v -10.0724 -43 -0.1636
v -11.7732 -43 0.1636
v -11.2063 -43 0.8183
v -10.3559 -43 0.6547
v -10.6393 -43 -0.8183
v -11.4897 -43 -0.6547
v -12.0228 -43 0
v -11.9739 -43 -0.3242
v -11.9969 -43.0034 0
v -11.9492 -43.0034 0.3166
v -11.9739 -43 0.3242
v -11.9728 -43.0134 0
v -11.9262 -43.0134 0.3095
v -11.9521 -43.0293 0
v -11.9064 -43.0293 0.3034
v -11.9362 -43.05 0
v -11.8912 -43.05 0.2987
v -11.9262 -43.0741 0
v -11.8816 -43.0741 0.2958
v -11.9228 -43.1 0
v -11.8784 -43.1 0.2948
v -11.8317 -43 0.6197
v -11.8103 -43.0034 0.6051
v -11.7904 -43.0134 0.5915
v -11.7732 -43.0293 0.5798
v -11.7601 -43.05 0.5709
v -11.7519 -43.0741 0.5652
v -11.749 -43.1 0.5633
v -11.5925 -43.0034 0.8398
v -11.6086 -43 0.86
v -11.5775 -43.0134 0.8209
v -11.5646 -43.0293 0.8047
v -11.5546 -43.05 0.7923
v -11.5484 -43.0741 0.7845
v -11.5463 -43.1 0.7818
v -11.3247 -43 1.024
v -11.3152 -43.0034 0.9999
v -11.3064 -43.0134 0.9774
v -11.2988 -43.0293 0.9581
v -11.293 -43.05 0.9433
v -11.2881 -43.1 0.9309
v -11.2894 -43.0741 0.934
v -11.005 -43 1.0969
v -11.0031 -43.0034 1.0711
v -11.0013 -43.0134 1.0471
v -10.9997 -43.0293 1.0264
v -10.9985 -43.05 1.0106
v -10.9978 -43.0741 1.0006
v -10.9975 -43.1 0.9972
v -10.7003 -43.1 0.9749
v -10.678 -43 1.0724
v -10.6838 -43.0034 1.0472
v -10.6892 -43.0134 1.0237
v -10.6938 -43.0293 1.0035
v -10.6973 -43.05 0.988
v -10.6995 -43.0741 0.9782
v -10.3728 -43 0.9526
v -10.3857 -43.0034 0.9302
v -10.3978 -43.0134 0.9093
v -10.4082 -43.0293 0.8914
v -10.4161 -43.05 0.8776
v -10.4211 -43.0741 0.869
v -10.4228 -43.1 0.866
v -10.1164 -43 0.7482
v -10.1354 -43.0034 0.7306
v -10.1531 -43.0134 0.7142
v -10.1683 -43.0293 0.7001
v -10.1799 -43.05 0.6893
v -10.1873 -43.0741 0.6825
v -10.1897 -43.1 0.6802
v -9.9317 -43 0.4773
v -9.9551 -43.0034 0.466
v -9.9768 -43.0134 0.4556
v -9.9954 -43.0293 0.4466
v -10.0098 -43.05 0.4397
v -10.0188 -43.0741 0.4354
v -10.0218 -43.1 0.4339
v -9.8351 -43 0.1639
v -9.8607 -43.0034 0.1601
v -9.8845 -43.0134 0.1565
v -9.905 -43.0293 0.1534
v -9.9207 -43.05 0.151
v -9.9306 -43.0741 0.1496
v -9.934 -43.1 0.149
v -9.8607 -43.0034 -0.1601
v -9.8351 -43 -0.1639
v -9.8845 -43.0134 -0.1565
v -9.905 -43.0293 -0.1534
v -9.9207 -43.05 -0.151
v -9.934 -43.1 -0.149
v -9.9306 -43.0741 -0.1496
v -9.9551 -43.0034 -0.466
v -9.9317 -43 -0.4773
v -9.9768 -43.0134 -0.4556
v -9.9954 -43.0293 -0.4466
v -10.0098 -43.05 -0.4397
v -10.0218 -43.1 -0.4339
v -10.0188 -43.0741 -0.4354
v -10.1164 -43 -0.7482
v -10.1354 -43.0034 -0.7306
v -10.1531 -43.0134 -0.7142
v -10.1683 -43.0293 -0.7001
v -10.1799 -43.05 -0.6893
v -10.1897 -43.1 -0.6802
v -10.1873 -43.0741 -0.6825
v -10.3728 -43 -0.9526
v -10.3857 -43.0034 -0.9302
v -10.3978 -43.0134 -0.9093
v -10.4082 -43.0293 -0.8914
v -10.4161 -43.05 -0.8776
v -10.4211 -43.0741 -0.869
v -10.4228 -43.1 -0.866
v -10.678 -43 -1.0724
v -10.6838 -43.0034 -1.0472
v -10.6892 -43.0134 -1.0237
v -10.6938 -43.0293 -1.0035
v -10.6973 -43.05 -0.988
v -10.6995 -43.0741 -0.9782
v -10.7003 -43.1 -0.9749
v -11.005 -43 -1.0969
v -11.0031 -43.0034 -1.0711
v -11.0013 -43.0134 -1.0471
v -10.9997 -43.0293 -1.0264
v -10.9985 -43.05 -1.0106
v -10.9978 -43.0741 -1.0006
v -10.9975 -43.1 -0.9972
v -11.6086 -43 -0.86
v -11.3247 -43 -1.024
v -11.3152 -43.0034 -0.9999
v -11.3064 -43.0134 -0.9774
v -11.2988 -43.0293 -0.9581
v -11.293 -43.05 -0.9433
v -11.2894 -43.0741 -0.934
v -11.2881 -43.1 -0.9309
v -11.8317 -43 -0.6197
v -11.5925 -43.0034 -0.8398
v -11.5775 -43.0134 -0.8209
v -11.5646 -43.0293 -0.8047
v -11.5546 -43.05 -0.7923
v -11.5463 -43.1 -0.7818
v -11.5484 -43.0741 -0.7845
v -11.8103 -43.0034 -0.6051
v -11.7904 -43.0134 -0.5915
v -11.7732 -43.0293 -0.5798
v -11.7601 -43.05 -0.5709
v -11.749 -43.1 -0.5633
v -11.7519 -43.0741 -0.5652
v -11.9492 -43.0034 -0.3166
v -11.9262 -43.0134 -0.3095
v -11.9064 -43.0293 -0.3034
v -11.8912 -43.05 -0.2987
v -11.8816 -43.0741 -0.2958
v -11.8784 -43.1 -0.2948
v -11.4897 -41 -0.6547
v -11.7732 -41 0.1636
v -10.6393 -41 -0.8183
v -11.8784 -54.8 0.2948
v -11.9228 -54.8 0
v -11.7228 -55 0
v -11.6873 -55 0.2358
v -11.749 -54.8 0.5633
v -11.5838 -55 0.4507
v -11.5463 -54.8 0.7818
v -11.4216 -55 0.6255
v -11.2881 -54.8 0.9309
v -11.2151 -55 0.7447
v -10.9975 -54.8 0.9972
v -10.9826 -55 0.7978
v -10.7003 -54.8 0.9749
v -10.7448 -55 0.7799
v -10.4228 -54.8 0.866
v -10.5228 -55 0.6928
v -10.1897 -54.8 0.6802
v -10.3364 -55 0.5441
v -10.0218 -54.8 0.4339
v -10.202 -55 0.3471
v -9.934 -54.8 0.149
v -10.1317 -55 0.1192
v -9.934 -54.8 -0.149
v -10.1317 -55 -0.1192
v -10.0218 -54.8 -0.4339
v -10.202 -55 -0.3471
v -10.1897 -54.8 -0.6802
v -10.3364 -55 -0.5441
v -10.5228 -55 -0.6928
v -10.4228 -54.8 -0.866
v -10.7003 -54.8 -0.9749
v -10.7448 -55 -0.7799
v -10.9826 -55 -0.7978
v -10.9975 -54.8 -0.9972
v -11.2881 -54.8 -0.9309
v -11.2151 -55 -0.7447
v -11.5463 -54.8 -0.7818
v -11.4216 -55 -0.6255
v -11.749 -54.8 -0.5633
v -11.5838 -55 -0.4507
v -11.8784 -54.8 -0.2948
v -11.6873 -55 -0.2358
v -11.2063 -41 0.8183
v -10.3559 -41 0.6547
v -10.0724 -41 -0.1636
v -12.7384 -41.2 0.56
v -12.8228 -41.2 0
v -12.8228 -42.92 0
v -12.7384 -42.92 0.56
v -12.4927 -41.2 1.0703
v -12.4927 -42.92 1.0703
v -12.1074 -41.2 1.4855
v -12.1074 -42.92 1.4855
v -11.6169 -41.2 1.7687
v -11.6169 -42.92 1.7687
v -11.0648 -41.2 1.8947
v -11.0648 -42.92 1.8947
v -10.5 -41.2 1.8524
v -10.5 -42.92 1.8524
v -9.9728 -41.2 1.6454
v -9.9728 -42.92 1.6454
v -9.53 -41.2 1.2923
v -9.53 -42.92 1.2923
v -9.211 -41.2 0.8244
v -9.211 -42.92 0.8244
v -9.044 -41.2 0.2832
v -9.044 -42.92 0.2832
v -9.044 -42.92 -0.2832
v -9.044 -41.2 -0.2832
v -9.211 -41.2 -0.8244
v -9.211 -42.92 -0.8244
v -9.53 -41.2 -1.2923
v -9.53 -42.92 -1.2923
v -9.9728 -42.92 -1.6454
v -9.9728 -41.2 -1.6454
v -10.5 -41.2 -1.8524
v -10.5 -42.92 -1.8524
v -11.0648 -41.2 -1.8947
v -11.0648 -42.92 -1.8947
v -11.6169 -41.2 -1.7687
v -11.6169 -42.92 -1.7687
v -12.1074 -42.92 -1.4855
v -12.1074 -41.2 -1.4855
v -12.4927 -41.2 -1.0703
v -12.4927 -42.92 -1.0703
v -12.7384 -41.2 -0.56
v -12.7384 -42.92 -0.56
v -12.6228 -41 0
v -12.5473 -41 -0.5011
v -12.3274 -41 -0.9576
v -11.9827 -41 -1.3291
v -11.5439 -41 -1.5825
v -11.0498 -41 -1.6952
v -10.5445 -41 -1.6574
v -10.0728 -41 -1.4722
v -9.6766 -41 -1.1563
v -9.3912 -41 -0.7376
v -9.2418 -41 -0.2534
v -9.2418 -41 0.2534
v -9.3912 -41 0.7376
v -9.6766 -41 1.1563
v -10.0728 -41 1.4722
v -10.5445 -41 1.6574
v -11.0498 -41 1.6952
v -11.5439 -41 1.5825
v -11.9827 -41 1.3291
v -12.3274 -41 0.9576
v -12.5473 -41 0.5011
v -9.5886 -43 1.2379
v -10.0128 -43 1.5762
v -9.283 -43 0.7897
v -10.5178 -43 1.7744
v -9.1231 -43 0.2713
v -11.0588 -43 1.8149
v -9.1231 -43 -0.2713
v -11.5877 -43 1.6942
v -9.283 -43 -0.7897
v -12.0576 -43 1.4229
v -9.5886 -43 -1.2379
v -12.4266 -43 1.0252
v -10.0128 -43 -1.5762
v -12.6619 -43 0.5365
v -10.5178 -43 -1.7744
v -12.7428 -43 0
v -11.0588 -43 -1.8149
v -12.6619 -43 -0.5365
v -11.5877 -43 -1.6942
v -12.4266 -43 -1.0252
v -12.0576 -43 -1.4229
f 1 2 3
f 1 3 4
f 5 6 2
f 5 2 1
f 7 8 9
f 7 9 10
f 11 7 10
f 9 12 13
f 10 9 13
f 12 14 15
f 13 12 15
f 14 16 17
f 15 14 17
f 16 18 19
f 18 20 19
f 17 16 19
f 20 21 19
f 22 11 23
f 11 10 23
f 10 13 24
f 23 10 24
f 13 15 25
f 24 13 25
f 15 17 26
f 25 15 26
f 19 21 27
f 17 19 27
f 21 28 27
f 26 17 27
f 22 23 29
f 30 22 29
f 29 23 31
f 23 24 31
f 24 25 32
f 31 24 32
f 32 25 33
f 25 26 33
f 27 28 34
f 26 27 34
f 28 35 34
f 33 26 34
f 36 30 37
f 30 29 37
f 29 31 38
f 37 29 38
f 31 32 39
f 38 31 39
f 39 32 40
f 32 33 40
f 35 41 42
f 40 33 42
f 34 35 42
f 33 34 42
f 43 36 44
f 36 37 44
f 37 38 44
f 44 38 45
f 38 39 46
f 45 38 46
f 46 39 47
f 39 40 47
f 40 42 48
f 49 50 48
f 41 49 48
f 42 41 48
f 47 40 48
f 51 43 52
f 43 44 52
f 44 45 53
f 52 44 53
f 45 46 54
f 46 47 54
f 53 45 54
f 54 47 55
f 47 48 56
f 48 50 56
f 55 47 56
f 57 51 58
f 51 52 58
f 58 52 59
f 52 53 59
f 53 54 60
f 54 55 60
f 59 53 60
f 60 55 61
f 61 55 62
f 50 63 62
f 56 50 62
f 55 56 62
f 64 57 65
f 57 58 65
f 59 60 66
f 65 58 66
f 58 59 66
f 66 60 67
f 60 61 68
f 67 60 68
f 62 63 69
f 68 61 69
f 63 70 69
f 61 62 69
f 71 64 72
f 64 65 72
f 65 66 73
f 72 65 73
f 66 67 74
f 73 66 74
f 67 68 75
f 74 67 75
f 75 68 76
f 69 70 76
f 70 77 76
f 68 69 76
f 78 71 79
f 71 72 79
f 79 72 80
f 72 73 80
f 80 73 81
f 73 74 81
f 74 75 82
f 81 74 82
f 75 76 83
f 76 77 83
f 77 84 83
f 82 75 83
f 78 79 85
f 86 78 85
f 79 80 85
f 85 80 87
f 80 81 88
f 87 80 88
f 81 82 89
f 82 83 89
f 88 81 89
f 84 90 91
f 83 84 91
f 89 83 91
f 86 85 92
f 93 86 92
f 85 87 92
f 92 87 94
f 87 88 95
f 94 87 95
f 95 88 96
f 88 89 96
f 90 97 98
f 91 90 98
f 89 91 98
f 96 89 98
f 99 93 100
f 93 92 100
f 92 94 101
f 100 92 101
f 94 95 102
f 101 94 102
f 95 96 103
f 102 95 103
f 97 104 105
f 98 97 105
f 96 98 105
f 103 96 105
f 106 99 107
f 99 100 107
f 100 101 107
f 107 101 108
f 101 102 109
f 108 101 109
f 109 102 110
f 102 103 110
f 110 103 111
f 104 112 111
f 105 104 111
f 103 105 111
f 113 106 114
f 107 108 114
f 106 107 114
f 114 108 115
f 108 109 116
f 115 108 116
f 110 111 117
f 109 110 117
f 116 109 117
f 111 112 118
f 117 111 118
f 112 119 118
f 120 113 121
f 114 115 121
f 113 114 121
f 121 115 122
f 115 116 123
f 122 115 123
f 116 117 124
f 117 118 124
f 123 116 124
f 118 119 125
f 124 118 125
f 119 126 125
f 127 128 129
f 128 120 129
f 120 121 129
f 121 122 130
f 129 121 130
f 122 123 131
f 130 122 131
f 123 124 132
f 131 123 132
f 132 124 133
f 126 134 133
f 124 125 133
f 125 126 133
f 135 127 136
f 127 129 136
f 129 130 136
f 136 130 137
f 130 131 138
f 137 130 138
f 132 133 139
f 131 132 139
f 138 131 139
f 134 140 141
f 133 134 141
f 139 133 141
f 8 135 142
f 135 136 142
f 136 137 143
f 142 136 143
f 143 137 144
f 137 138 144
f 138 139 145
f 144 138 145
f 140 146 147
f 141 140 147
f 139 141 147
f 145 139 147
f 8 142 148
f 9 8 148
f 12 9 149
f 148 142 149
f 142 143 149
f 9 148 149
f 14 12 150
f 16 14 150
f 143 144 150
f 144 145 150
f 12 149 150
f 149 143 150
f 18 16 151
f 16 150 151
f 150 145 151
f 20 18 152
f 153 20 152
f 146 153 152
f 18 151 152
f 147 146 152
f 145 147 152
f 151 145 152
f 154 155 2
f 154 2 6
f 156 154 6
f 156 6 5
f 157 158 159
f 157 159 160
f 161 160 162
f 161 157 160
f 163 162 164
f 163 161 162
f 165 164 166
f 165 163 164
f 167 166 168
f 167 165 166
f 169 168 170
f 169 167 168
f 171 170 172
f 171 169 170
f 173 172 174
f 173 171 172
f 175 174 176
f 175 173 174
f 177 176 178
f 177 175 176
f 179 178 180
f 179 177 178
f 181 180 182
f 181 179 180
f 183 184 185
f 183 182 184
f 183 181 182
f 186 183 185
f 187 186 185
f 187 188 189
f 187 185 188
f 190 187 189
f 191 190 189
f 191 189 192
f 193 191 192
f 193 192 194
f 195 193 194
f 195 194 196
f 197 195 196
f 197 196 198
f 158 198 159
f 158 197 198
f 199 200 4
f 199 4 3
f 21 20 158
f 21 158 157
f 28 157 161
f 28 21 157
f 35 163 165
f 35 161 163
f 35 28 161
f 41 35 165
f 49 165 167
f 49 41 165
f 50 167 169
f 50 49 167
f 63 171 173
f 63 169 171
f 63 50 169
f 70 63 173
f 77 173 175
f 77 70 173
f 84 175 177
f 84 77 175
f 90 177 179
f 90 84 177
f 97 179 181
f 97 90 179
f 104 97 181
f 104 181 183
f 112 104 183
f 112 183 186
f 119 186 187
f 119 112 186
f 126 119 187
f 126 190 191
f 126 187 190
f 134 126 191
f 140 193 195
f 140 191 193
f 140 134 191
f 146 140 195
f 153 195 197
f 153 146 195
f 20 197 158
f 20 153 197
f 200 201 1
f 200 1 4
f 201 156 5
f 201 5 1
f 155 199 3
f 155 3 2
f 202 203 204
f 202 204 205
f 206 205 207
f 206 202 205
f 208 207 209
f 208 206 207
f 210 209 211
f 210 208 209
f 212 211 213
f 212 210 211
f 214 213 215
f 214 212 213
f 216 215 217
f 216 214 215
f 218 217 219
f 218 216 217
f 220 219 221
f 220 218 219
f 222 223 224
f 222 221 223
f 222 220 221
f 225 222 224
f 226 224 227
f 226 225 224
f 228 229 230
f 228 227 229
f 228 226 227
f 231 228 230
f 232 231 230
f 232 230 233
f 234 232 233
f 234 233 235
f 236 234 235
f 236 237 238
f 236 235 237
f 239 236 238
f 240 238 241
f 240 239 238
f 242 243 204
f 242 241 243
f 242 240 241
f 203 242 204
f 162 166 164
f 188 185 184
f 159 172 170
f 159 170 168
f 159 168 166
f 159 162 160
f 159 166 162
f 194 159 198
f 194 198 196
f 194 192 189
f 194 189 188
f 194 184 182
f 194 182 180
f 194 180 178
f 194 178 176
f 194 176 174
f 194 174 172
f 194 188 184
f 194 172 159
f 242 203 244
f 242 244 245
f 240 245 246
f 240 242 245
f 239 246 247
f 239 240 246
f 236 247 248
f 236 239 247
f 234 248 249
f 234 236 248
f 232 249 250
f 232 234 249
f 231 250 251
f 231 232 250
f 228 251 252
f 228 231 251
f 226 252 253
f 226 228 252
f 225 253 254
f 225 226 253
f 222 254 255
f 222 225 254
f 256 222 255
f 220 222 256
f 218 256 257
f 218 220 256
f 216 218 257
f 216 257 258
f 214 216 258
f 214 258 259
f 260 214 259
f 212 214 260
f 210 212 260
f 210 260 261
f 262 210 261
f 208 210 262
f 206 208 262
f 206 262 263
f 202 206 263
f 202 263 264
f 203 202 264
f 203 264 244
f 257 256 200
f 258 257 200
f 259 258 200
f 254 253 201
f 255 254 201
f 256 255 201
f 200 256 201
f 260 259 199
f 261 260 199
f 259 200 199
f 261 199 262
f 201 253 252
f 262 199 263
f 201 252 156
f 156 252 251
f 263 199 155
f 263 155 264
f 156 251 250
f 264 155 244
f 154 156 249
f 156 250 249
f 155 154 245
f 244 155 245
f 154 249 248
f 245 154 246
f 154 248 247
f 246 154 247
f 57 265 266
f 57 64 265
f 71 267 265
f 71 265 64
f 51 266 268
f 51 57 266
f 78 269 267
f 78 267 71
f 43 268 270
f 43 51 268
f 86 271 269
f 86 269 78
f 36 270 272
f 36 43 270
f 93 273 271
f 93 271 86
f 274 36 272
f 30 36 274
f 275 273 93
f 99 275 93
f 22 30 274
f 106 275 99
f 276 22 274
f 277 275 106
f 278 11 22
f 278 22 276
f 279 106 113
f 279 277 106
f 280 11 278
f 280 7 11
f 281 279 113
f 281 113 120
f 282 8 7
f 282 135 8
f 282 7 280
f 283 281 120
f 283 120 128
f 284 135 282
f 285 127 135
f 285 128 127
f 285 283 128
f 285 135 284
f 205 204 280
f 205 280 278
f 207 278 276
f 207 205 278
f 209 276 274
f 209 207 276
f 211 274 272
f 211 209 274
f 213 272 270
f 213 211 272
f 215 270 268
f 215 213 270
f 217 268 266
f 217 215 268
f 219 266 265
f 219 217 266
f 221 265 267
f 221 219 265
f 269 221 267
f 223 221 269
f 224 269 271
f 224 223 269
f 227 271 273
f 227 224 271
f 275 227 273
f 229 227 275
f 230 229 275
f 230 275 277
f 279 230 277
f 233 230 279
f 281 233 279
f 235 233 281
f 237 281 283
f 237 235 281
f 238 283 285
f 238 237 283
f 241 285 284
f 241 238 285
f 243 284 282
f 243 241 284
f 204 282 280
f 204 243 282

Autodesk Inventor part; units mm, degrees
ref_plane "YZ Plane" through (0, 0, 0) normal (1, 0, 0) x (0, 1, 0)
ref_plane "XZ Plane" through (0, 0, 0) normal (0, 1, 0) x (-1, 0, 0)
ref_plane "XY Plane" through (0, 0, 0) normal (0, 0, 1) x (1, 0, 0)
sketch "Sketch1" plane through (0, 0, 0) normal (0, 0, 1) x (1, 0, 0)
  line L0 (-10.9228, -43) -> (-12.8228, -43)
  line L1 (-12.8228, -43) -> (-12.8228, -41)
  line L2 (-12.8228, -41) -> (-10.9228, -41)
  line L3 (-10.9228, -41) -> (-10.9228, -43)
  line L4 (-10.9228, -43) -> (-10.9228, -55)
  line L5 (-10.9228, -55) -> (-11.9228, -55)
  line L6 (-11.9228, -55) -> (-11.9228, -43)
  dimension "d0" = 1.9
  dimension "d1" = 2
  dimension "d3" = 1
  dimension "d16" = 12
revolve "Revolution1" add sketch "Sketch1" angle 360 about axis through (-10.9228, -43, 0) along (0, -1, 0)
chamfer "Chamfer1" distance 0.2 angle 45 1 edges at (-9.0228, -41, 0)
sketch "Boceto2" plane through (-10.9228, -41, 0) normal (0, 1, 0) x (1, 0, 0)
  line L0 (0.5669, -0.6547) -> (-0.2835, -0.8183)
  line L1 (-0.2835, -0.8183) -> (-0.8504, -0.1636)
  line L2 (-0.8504, -0.1636) -> (-0.5669, 0.6547)
  line L3 (-0.5669, 0.6547) -> (0.2835, 0.8183)
  line L4 (0.2835, 0.8183) -> (0.8504, 0.1636)
  line L5 (0.8504, 0.1636) -> (0.5669, -0.6547)
  point P0 (10.9228, 0)
  point P1 (0, 0)
  dimension "d11" = 1.5
extrude "Extrusión1" cut sketch "Boceto2" against normal blind 2
fillet "Fillet1" radius 0.1 1 edges at (-9.9228, -43, 0)
chamfer "Chamfer3" distance 0.2 angle 45 1 edges at (-9.9228, -55, 0)
thread "Thread2" size "M2x0.4" class "6g" standard "ISO Metric profile" length 98
chamfer "Chamfer4" distance 0.08 angle 45 1 edges at (-9.0228, -43, 0)
properties part number "Tornillo Allen cabeza cilindrica M2x16mm"
